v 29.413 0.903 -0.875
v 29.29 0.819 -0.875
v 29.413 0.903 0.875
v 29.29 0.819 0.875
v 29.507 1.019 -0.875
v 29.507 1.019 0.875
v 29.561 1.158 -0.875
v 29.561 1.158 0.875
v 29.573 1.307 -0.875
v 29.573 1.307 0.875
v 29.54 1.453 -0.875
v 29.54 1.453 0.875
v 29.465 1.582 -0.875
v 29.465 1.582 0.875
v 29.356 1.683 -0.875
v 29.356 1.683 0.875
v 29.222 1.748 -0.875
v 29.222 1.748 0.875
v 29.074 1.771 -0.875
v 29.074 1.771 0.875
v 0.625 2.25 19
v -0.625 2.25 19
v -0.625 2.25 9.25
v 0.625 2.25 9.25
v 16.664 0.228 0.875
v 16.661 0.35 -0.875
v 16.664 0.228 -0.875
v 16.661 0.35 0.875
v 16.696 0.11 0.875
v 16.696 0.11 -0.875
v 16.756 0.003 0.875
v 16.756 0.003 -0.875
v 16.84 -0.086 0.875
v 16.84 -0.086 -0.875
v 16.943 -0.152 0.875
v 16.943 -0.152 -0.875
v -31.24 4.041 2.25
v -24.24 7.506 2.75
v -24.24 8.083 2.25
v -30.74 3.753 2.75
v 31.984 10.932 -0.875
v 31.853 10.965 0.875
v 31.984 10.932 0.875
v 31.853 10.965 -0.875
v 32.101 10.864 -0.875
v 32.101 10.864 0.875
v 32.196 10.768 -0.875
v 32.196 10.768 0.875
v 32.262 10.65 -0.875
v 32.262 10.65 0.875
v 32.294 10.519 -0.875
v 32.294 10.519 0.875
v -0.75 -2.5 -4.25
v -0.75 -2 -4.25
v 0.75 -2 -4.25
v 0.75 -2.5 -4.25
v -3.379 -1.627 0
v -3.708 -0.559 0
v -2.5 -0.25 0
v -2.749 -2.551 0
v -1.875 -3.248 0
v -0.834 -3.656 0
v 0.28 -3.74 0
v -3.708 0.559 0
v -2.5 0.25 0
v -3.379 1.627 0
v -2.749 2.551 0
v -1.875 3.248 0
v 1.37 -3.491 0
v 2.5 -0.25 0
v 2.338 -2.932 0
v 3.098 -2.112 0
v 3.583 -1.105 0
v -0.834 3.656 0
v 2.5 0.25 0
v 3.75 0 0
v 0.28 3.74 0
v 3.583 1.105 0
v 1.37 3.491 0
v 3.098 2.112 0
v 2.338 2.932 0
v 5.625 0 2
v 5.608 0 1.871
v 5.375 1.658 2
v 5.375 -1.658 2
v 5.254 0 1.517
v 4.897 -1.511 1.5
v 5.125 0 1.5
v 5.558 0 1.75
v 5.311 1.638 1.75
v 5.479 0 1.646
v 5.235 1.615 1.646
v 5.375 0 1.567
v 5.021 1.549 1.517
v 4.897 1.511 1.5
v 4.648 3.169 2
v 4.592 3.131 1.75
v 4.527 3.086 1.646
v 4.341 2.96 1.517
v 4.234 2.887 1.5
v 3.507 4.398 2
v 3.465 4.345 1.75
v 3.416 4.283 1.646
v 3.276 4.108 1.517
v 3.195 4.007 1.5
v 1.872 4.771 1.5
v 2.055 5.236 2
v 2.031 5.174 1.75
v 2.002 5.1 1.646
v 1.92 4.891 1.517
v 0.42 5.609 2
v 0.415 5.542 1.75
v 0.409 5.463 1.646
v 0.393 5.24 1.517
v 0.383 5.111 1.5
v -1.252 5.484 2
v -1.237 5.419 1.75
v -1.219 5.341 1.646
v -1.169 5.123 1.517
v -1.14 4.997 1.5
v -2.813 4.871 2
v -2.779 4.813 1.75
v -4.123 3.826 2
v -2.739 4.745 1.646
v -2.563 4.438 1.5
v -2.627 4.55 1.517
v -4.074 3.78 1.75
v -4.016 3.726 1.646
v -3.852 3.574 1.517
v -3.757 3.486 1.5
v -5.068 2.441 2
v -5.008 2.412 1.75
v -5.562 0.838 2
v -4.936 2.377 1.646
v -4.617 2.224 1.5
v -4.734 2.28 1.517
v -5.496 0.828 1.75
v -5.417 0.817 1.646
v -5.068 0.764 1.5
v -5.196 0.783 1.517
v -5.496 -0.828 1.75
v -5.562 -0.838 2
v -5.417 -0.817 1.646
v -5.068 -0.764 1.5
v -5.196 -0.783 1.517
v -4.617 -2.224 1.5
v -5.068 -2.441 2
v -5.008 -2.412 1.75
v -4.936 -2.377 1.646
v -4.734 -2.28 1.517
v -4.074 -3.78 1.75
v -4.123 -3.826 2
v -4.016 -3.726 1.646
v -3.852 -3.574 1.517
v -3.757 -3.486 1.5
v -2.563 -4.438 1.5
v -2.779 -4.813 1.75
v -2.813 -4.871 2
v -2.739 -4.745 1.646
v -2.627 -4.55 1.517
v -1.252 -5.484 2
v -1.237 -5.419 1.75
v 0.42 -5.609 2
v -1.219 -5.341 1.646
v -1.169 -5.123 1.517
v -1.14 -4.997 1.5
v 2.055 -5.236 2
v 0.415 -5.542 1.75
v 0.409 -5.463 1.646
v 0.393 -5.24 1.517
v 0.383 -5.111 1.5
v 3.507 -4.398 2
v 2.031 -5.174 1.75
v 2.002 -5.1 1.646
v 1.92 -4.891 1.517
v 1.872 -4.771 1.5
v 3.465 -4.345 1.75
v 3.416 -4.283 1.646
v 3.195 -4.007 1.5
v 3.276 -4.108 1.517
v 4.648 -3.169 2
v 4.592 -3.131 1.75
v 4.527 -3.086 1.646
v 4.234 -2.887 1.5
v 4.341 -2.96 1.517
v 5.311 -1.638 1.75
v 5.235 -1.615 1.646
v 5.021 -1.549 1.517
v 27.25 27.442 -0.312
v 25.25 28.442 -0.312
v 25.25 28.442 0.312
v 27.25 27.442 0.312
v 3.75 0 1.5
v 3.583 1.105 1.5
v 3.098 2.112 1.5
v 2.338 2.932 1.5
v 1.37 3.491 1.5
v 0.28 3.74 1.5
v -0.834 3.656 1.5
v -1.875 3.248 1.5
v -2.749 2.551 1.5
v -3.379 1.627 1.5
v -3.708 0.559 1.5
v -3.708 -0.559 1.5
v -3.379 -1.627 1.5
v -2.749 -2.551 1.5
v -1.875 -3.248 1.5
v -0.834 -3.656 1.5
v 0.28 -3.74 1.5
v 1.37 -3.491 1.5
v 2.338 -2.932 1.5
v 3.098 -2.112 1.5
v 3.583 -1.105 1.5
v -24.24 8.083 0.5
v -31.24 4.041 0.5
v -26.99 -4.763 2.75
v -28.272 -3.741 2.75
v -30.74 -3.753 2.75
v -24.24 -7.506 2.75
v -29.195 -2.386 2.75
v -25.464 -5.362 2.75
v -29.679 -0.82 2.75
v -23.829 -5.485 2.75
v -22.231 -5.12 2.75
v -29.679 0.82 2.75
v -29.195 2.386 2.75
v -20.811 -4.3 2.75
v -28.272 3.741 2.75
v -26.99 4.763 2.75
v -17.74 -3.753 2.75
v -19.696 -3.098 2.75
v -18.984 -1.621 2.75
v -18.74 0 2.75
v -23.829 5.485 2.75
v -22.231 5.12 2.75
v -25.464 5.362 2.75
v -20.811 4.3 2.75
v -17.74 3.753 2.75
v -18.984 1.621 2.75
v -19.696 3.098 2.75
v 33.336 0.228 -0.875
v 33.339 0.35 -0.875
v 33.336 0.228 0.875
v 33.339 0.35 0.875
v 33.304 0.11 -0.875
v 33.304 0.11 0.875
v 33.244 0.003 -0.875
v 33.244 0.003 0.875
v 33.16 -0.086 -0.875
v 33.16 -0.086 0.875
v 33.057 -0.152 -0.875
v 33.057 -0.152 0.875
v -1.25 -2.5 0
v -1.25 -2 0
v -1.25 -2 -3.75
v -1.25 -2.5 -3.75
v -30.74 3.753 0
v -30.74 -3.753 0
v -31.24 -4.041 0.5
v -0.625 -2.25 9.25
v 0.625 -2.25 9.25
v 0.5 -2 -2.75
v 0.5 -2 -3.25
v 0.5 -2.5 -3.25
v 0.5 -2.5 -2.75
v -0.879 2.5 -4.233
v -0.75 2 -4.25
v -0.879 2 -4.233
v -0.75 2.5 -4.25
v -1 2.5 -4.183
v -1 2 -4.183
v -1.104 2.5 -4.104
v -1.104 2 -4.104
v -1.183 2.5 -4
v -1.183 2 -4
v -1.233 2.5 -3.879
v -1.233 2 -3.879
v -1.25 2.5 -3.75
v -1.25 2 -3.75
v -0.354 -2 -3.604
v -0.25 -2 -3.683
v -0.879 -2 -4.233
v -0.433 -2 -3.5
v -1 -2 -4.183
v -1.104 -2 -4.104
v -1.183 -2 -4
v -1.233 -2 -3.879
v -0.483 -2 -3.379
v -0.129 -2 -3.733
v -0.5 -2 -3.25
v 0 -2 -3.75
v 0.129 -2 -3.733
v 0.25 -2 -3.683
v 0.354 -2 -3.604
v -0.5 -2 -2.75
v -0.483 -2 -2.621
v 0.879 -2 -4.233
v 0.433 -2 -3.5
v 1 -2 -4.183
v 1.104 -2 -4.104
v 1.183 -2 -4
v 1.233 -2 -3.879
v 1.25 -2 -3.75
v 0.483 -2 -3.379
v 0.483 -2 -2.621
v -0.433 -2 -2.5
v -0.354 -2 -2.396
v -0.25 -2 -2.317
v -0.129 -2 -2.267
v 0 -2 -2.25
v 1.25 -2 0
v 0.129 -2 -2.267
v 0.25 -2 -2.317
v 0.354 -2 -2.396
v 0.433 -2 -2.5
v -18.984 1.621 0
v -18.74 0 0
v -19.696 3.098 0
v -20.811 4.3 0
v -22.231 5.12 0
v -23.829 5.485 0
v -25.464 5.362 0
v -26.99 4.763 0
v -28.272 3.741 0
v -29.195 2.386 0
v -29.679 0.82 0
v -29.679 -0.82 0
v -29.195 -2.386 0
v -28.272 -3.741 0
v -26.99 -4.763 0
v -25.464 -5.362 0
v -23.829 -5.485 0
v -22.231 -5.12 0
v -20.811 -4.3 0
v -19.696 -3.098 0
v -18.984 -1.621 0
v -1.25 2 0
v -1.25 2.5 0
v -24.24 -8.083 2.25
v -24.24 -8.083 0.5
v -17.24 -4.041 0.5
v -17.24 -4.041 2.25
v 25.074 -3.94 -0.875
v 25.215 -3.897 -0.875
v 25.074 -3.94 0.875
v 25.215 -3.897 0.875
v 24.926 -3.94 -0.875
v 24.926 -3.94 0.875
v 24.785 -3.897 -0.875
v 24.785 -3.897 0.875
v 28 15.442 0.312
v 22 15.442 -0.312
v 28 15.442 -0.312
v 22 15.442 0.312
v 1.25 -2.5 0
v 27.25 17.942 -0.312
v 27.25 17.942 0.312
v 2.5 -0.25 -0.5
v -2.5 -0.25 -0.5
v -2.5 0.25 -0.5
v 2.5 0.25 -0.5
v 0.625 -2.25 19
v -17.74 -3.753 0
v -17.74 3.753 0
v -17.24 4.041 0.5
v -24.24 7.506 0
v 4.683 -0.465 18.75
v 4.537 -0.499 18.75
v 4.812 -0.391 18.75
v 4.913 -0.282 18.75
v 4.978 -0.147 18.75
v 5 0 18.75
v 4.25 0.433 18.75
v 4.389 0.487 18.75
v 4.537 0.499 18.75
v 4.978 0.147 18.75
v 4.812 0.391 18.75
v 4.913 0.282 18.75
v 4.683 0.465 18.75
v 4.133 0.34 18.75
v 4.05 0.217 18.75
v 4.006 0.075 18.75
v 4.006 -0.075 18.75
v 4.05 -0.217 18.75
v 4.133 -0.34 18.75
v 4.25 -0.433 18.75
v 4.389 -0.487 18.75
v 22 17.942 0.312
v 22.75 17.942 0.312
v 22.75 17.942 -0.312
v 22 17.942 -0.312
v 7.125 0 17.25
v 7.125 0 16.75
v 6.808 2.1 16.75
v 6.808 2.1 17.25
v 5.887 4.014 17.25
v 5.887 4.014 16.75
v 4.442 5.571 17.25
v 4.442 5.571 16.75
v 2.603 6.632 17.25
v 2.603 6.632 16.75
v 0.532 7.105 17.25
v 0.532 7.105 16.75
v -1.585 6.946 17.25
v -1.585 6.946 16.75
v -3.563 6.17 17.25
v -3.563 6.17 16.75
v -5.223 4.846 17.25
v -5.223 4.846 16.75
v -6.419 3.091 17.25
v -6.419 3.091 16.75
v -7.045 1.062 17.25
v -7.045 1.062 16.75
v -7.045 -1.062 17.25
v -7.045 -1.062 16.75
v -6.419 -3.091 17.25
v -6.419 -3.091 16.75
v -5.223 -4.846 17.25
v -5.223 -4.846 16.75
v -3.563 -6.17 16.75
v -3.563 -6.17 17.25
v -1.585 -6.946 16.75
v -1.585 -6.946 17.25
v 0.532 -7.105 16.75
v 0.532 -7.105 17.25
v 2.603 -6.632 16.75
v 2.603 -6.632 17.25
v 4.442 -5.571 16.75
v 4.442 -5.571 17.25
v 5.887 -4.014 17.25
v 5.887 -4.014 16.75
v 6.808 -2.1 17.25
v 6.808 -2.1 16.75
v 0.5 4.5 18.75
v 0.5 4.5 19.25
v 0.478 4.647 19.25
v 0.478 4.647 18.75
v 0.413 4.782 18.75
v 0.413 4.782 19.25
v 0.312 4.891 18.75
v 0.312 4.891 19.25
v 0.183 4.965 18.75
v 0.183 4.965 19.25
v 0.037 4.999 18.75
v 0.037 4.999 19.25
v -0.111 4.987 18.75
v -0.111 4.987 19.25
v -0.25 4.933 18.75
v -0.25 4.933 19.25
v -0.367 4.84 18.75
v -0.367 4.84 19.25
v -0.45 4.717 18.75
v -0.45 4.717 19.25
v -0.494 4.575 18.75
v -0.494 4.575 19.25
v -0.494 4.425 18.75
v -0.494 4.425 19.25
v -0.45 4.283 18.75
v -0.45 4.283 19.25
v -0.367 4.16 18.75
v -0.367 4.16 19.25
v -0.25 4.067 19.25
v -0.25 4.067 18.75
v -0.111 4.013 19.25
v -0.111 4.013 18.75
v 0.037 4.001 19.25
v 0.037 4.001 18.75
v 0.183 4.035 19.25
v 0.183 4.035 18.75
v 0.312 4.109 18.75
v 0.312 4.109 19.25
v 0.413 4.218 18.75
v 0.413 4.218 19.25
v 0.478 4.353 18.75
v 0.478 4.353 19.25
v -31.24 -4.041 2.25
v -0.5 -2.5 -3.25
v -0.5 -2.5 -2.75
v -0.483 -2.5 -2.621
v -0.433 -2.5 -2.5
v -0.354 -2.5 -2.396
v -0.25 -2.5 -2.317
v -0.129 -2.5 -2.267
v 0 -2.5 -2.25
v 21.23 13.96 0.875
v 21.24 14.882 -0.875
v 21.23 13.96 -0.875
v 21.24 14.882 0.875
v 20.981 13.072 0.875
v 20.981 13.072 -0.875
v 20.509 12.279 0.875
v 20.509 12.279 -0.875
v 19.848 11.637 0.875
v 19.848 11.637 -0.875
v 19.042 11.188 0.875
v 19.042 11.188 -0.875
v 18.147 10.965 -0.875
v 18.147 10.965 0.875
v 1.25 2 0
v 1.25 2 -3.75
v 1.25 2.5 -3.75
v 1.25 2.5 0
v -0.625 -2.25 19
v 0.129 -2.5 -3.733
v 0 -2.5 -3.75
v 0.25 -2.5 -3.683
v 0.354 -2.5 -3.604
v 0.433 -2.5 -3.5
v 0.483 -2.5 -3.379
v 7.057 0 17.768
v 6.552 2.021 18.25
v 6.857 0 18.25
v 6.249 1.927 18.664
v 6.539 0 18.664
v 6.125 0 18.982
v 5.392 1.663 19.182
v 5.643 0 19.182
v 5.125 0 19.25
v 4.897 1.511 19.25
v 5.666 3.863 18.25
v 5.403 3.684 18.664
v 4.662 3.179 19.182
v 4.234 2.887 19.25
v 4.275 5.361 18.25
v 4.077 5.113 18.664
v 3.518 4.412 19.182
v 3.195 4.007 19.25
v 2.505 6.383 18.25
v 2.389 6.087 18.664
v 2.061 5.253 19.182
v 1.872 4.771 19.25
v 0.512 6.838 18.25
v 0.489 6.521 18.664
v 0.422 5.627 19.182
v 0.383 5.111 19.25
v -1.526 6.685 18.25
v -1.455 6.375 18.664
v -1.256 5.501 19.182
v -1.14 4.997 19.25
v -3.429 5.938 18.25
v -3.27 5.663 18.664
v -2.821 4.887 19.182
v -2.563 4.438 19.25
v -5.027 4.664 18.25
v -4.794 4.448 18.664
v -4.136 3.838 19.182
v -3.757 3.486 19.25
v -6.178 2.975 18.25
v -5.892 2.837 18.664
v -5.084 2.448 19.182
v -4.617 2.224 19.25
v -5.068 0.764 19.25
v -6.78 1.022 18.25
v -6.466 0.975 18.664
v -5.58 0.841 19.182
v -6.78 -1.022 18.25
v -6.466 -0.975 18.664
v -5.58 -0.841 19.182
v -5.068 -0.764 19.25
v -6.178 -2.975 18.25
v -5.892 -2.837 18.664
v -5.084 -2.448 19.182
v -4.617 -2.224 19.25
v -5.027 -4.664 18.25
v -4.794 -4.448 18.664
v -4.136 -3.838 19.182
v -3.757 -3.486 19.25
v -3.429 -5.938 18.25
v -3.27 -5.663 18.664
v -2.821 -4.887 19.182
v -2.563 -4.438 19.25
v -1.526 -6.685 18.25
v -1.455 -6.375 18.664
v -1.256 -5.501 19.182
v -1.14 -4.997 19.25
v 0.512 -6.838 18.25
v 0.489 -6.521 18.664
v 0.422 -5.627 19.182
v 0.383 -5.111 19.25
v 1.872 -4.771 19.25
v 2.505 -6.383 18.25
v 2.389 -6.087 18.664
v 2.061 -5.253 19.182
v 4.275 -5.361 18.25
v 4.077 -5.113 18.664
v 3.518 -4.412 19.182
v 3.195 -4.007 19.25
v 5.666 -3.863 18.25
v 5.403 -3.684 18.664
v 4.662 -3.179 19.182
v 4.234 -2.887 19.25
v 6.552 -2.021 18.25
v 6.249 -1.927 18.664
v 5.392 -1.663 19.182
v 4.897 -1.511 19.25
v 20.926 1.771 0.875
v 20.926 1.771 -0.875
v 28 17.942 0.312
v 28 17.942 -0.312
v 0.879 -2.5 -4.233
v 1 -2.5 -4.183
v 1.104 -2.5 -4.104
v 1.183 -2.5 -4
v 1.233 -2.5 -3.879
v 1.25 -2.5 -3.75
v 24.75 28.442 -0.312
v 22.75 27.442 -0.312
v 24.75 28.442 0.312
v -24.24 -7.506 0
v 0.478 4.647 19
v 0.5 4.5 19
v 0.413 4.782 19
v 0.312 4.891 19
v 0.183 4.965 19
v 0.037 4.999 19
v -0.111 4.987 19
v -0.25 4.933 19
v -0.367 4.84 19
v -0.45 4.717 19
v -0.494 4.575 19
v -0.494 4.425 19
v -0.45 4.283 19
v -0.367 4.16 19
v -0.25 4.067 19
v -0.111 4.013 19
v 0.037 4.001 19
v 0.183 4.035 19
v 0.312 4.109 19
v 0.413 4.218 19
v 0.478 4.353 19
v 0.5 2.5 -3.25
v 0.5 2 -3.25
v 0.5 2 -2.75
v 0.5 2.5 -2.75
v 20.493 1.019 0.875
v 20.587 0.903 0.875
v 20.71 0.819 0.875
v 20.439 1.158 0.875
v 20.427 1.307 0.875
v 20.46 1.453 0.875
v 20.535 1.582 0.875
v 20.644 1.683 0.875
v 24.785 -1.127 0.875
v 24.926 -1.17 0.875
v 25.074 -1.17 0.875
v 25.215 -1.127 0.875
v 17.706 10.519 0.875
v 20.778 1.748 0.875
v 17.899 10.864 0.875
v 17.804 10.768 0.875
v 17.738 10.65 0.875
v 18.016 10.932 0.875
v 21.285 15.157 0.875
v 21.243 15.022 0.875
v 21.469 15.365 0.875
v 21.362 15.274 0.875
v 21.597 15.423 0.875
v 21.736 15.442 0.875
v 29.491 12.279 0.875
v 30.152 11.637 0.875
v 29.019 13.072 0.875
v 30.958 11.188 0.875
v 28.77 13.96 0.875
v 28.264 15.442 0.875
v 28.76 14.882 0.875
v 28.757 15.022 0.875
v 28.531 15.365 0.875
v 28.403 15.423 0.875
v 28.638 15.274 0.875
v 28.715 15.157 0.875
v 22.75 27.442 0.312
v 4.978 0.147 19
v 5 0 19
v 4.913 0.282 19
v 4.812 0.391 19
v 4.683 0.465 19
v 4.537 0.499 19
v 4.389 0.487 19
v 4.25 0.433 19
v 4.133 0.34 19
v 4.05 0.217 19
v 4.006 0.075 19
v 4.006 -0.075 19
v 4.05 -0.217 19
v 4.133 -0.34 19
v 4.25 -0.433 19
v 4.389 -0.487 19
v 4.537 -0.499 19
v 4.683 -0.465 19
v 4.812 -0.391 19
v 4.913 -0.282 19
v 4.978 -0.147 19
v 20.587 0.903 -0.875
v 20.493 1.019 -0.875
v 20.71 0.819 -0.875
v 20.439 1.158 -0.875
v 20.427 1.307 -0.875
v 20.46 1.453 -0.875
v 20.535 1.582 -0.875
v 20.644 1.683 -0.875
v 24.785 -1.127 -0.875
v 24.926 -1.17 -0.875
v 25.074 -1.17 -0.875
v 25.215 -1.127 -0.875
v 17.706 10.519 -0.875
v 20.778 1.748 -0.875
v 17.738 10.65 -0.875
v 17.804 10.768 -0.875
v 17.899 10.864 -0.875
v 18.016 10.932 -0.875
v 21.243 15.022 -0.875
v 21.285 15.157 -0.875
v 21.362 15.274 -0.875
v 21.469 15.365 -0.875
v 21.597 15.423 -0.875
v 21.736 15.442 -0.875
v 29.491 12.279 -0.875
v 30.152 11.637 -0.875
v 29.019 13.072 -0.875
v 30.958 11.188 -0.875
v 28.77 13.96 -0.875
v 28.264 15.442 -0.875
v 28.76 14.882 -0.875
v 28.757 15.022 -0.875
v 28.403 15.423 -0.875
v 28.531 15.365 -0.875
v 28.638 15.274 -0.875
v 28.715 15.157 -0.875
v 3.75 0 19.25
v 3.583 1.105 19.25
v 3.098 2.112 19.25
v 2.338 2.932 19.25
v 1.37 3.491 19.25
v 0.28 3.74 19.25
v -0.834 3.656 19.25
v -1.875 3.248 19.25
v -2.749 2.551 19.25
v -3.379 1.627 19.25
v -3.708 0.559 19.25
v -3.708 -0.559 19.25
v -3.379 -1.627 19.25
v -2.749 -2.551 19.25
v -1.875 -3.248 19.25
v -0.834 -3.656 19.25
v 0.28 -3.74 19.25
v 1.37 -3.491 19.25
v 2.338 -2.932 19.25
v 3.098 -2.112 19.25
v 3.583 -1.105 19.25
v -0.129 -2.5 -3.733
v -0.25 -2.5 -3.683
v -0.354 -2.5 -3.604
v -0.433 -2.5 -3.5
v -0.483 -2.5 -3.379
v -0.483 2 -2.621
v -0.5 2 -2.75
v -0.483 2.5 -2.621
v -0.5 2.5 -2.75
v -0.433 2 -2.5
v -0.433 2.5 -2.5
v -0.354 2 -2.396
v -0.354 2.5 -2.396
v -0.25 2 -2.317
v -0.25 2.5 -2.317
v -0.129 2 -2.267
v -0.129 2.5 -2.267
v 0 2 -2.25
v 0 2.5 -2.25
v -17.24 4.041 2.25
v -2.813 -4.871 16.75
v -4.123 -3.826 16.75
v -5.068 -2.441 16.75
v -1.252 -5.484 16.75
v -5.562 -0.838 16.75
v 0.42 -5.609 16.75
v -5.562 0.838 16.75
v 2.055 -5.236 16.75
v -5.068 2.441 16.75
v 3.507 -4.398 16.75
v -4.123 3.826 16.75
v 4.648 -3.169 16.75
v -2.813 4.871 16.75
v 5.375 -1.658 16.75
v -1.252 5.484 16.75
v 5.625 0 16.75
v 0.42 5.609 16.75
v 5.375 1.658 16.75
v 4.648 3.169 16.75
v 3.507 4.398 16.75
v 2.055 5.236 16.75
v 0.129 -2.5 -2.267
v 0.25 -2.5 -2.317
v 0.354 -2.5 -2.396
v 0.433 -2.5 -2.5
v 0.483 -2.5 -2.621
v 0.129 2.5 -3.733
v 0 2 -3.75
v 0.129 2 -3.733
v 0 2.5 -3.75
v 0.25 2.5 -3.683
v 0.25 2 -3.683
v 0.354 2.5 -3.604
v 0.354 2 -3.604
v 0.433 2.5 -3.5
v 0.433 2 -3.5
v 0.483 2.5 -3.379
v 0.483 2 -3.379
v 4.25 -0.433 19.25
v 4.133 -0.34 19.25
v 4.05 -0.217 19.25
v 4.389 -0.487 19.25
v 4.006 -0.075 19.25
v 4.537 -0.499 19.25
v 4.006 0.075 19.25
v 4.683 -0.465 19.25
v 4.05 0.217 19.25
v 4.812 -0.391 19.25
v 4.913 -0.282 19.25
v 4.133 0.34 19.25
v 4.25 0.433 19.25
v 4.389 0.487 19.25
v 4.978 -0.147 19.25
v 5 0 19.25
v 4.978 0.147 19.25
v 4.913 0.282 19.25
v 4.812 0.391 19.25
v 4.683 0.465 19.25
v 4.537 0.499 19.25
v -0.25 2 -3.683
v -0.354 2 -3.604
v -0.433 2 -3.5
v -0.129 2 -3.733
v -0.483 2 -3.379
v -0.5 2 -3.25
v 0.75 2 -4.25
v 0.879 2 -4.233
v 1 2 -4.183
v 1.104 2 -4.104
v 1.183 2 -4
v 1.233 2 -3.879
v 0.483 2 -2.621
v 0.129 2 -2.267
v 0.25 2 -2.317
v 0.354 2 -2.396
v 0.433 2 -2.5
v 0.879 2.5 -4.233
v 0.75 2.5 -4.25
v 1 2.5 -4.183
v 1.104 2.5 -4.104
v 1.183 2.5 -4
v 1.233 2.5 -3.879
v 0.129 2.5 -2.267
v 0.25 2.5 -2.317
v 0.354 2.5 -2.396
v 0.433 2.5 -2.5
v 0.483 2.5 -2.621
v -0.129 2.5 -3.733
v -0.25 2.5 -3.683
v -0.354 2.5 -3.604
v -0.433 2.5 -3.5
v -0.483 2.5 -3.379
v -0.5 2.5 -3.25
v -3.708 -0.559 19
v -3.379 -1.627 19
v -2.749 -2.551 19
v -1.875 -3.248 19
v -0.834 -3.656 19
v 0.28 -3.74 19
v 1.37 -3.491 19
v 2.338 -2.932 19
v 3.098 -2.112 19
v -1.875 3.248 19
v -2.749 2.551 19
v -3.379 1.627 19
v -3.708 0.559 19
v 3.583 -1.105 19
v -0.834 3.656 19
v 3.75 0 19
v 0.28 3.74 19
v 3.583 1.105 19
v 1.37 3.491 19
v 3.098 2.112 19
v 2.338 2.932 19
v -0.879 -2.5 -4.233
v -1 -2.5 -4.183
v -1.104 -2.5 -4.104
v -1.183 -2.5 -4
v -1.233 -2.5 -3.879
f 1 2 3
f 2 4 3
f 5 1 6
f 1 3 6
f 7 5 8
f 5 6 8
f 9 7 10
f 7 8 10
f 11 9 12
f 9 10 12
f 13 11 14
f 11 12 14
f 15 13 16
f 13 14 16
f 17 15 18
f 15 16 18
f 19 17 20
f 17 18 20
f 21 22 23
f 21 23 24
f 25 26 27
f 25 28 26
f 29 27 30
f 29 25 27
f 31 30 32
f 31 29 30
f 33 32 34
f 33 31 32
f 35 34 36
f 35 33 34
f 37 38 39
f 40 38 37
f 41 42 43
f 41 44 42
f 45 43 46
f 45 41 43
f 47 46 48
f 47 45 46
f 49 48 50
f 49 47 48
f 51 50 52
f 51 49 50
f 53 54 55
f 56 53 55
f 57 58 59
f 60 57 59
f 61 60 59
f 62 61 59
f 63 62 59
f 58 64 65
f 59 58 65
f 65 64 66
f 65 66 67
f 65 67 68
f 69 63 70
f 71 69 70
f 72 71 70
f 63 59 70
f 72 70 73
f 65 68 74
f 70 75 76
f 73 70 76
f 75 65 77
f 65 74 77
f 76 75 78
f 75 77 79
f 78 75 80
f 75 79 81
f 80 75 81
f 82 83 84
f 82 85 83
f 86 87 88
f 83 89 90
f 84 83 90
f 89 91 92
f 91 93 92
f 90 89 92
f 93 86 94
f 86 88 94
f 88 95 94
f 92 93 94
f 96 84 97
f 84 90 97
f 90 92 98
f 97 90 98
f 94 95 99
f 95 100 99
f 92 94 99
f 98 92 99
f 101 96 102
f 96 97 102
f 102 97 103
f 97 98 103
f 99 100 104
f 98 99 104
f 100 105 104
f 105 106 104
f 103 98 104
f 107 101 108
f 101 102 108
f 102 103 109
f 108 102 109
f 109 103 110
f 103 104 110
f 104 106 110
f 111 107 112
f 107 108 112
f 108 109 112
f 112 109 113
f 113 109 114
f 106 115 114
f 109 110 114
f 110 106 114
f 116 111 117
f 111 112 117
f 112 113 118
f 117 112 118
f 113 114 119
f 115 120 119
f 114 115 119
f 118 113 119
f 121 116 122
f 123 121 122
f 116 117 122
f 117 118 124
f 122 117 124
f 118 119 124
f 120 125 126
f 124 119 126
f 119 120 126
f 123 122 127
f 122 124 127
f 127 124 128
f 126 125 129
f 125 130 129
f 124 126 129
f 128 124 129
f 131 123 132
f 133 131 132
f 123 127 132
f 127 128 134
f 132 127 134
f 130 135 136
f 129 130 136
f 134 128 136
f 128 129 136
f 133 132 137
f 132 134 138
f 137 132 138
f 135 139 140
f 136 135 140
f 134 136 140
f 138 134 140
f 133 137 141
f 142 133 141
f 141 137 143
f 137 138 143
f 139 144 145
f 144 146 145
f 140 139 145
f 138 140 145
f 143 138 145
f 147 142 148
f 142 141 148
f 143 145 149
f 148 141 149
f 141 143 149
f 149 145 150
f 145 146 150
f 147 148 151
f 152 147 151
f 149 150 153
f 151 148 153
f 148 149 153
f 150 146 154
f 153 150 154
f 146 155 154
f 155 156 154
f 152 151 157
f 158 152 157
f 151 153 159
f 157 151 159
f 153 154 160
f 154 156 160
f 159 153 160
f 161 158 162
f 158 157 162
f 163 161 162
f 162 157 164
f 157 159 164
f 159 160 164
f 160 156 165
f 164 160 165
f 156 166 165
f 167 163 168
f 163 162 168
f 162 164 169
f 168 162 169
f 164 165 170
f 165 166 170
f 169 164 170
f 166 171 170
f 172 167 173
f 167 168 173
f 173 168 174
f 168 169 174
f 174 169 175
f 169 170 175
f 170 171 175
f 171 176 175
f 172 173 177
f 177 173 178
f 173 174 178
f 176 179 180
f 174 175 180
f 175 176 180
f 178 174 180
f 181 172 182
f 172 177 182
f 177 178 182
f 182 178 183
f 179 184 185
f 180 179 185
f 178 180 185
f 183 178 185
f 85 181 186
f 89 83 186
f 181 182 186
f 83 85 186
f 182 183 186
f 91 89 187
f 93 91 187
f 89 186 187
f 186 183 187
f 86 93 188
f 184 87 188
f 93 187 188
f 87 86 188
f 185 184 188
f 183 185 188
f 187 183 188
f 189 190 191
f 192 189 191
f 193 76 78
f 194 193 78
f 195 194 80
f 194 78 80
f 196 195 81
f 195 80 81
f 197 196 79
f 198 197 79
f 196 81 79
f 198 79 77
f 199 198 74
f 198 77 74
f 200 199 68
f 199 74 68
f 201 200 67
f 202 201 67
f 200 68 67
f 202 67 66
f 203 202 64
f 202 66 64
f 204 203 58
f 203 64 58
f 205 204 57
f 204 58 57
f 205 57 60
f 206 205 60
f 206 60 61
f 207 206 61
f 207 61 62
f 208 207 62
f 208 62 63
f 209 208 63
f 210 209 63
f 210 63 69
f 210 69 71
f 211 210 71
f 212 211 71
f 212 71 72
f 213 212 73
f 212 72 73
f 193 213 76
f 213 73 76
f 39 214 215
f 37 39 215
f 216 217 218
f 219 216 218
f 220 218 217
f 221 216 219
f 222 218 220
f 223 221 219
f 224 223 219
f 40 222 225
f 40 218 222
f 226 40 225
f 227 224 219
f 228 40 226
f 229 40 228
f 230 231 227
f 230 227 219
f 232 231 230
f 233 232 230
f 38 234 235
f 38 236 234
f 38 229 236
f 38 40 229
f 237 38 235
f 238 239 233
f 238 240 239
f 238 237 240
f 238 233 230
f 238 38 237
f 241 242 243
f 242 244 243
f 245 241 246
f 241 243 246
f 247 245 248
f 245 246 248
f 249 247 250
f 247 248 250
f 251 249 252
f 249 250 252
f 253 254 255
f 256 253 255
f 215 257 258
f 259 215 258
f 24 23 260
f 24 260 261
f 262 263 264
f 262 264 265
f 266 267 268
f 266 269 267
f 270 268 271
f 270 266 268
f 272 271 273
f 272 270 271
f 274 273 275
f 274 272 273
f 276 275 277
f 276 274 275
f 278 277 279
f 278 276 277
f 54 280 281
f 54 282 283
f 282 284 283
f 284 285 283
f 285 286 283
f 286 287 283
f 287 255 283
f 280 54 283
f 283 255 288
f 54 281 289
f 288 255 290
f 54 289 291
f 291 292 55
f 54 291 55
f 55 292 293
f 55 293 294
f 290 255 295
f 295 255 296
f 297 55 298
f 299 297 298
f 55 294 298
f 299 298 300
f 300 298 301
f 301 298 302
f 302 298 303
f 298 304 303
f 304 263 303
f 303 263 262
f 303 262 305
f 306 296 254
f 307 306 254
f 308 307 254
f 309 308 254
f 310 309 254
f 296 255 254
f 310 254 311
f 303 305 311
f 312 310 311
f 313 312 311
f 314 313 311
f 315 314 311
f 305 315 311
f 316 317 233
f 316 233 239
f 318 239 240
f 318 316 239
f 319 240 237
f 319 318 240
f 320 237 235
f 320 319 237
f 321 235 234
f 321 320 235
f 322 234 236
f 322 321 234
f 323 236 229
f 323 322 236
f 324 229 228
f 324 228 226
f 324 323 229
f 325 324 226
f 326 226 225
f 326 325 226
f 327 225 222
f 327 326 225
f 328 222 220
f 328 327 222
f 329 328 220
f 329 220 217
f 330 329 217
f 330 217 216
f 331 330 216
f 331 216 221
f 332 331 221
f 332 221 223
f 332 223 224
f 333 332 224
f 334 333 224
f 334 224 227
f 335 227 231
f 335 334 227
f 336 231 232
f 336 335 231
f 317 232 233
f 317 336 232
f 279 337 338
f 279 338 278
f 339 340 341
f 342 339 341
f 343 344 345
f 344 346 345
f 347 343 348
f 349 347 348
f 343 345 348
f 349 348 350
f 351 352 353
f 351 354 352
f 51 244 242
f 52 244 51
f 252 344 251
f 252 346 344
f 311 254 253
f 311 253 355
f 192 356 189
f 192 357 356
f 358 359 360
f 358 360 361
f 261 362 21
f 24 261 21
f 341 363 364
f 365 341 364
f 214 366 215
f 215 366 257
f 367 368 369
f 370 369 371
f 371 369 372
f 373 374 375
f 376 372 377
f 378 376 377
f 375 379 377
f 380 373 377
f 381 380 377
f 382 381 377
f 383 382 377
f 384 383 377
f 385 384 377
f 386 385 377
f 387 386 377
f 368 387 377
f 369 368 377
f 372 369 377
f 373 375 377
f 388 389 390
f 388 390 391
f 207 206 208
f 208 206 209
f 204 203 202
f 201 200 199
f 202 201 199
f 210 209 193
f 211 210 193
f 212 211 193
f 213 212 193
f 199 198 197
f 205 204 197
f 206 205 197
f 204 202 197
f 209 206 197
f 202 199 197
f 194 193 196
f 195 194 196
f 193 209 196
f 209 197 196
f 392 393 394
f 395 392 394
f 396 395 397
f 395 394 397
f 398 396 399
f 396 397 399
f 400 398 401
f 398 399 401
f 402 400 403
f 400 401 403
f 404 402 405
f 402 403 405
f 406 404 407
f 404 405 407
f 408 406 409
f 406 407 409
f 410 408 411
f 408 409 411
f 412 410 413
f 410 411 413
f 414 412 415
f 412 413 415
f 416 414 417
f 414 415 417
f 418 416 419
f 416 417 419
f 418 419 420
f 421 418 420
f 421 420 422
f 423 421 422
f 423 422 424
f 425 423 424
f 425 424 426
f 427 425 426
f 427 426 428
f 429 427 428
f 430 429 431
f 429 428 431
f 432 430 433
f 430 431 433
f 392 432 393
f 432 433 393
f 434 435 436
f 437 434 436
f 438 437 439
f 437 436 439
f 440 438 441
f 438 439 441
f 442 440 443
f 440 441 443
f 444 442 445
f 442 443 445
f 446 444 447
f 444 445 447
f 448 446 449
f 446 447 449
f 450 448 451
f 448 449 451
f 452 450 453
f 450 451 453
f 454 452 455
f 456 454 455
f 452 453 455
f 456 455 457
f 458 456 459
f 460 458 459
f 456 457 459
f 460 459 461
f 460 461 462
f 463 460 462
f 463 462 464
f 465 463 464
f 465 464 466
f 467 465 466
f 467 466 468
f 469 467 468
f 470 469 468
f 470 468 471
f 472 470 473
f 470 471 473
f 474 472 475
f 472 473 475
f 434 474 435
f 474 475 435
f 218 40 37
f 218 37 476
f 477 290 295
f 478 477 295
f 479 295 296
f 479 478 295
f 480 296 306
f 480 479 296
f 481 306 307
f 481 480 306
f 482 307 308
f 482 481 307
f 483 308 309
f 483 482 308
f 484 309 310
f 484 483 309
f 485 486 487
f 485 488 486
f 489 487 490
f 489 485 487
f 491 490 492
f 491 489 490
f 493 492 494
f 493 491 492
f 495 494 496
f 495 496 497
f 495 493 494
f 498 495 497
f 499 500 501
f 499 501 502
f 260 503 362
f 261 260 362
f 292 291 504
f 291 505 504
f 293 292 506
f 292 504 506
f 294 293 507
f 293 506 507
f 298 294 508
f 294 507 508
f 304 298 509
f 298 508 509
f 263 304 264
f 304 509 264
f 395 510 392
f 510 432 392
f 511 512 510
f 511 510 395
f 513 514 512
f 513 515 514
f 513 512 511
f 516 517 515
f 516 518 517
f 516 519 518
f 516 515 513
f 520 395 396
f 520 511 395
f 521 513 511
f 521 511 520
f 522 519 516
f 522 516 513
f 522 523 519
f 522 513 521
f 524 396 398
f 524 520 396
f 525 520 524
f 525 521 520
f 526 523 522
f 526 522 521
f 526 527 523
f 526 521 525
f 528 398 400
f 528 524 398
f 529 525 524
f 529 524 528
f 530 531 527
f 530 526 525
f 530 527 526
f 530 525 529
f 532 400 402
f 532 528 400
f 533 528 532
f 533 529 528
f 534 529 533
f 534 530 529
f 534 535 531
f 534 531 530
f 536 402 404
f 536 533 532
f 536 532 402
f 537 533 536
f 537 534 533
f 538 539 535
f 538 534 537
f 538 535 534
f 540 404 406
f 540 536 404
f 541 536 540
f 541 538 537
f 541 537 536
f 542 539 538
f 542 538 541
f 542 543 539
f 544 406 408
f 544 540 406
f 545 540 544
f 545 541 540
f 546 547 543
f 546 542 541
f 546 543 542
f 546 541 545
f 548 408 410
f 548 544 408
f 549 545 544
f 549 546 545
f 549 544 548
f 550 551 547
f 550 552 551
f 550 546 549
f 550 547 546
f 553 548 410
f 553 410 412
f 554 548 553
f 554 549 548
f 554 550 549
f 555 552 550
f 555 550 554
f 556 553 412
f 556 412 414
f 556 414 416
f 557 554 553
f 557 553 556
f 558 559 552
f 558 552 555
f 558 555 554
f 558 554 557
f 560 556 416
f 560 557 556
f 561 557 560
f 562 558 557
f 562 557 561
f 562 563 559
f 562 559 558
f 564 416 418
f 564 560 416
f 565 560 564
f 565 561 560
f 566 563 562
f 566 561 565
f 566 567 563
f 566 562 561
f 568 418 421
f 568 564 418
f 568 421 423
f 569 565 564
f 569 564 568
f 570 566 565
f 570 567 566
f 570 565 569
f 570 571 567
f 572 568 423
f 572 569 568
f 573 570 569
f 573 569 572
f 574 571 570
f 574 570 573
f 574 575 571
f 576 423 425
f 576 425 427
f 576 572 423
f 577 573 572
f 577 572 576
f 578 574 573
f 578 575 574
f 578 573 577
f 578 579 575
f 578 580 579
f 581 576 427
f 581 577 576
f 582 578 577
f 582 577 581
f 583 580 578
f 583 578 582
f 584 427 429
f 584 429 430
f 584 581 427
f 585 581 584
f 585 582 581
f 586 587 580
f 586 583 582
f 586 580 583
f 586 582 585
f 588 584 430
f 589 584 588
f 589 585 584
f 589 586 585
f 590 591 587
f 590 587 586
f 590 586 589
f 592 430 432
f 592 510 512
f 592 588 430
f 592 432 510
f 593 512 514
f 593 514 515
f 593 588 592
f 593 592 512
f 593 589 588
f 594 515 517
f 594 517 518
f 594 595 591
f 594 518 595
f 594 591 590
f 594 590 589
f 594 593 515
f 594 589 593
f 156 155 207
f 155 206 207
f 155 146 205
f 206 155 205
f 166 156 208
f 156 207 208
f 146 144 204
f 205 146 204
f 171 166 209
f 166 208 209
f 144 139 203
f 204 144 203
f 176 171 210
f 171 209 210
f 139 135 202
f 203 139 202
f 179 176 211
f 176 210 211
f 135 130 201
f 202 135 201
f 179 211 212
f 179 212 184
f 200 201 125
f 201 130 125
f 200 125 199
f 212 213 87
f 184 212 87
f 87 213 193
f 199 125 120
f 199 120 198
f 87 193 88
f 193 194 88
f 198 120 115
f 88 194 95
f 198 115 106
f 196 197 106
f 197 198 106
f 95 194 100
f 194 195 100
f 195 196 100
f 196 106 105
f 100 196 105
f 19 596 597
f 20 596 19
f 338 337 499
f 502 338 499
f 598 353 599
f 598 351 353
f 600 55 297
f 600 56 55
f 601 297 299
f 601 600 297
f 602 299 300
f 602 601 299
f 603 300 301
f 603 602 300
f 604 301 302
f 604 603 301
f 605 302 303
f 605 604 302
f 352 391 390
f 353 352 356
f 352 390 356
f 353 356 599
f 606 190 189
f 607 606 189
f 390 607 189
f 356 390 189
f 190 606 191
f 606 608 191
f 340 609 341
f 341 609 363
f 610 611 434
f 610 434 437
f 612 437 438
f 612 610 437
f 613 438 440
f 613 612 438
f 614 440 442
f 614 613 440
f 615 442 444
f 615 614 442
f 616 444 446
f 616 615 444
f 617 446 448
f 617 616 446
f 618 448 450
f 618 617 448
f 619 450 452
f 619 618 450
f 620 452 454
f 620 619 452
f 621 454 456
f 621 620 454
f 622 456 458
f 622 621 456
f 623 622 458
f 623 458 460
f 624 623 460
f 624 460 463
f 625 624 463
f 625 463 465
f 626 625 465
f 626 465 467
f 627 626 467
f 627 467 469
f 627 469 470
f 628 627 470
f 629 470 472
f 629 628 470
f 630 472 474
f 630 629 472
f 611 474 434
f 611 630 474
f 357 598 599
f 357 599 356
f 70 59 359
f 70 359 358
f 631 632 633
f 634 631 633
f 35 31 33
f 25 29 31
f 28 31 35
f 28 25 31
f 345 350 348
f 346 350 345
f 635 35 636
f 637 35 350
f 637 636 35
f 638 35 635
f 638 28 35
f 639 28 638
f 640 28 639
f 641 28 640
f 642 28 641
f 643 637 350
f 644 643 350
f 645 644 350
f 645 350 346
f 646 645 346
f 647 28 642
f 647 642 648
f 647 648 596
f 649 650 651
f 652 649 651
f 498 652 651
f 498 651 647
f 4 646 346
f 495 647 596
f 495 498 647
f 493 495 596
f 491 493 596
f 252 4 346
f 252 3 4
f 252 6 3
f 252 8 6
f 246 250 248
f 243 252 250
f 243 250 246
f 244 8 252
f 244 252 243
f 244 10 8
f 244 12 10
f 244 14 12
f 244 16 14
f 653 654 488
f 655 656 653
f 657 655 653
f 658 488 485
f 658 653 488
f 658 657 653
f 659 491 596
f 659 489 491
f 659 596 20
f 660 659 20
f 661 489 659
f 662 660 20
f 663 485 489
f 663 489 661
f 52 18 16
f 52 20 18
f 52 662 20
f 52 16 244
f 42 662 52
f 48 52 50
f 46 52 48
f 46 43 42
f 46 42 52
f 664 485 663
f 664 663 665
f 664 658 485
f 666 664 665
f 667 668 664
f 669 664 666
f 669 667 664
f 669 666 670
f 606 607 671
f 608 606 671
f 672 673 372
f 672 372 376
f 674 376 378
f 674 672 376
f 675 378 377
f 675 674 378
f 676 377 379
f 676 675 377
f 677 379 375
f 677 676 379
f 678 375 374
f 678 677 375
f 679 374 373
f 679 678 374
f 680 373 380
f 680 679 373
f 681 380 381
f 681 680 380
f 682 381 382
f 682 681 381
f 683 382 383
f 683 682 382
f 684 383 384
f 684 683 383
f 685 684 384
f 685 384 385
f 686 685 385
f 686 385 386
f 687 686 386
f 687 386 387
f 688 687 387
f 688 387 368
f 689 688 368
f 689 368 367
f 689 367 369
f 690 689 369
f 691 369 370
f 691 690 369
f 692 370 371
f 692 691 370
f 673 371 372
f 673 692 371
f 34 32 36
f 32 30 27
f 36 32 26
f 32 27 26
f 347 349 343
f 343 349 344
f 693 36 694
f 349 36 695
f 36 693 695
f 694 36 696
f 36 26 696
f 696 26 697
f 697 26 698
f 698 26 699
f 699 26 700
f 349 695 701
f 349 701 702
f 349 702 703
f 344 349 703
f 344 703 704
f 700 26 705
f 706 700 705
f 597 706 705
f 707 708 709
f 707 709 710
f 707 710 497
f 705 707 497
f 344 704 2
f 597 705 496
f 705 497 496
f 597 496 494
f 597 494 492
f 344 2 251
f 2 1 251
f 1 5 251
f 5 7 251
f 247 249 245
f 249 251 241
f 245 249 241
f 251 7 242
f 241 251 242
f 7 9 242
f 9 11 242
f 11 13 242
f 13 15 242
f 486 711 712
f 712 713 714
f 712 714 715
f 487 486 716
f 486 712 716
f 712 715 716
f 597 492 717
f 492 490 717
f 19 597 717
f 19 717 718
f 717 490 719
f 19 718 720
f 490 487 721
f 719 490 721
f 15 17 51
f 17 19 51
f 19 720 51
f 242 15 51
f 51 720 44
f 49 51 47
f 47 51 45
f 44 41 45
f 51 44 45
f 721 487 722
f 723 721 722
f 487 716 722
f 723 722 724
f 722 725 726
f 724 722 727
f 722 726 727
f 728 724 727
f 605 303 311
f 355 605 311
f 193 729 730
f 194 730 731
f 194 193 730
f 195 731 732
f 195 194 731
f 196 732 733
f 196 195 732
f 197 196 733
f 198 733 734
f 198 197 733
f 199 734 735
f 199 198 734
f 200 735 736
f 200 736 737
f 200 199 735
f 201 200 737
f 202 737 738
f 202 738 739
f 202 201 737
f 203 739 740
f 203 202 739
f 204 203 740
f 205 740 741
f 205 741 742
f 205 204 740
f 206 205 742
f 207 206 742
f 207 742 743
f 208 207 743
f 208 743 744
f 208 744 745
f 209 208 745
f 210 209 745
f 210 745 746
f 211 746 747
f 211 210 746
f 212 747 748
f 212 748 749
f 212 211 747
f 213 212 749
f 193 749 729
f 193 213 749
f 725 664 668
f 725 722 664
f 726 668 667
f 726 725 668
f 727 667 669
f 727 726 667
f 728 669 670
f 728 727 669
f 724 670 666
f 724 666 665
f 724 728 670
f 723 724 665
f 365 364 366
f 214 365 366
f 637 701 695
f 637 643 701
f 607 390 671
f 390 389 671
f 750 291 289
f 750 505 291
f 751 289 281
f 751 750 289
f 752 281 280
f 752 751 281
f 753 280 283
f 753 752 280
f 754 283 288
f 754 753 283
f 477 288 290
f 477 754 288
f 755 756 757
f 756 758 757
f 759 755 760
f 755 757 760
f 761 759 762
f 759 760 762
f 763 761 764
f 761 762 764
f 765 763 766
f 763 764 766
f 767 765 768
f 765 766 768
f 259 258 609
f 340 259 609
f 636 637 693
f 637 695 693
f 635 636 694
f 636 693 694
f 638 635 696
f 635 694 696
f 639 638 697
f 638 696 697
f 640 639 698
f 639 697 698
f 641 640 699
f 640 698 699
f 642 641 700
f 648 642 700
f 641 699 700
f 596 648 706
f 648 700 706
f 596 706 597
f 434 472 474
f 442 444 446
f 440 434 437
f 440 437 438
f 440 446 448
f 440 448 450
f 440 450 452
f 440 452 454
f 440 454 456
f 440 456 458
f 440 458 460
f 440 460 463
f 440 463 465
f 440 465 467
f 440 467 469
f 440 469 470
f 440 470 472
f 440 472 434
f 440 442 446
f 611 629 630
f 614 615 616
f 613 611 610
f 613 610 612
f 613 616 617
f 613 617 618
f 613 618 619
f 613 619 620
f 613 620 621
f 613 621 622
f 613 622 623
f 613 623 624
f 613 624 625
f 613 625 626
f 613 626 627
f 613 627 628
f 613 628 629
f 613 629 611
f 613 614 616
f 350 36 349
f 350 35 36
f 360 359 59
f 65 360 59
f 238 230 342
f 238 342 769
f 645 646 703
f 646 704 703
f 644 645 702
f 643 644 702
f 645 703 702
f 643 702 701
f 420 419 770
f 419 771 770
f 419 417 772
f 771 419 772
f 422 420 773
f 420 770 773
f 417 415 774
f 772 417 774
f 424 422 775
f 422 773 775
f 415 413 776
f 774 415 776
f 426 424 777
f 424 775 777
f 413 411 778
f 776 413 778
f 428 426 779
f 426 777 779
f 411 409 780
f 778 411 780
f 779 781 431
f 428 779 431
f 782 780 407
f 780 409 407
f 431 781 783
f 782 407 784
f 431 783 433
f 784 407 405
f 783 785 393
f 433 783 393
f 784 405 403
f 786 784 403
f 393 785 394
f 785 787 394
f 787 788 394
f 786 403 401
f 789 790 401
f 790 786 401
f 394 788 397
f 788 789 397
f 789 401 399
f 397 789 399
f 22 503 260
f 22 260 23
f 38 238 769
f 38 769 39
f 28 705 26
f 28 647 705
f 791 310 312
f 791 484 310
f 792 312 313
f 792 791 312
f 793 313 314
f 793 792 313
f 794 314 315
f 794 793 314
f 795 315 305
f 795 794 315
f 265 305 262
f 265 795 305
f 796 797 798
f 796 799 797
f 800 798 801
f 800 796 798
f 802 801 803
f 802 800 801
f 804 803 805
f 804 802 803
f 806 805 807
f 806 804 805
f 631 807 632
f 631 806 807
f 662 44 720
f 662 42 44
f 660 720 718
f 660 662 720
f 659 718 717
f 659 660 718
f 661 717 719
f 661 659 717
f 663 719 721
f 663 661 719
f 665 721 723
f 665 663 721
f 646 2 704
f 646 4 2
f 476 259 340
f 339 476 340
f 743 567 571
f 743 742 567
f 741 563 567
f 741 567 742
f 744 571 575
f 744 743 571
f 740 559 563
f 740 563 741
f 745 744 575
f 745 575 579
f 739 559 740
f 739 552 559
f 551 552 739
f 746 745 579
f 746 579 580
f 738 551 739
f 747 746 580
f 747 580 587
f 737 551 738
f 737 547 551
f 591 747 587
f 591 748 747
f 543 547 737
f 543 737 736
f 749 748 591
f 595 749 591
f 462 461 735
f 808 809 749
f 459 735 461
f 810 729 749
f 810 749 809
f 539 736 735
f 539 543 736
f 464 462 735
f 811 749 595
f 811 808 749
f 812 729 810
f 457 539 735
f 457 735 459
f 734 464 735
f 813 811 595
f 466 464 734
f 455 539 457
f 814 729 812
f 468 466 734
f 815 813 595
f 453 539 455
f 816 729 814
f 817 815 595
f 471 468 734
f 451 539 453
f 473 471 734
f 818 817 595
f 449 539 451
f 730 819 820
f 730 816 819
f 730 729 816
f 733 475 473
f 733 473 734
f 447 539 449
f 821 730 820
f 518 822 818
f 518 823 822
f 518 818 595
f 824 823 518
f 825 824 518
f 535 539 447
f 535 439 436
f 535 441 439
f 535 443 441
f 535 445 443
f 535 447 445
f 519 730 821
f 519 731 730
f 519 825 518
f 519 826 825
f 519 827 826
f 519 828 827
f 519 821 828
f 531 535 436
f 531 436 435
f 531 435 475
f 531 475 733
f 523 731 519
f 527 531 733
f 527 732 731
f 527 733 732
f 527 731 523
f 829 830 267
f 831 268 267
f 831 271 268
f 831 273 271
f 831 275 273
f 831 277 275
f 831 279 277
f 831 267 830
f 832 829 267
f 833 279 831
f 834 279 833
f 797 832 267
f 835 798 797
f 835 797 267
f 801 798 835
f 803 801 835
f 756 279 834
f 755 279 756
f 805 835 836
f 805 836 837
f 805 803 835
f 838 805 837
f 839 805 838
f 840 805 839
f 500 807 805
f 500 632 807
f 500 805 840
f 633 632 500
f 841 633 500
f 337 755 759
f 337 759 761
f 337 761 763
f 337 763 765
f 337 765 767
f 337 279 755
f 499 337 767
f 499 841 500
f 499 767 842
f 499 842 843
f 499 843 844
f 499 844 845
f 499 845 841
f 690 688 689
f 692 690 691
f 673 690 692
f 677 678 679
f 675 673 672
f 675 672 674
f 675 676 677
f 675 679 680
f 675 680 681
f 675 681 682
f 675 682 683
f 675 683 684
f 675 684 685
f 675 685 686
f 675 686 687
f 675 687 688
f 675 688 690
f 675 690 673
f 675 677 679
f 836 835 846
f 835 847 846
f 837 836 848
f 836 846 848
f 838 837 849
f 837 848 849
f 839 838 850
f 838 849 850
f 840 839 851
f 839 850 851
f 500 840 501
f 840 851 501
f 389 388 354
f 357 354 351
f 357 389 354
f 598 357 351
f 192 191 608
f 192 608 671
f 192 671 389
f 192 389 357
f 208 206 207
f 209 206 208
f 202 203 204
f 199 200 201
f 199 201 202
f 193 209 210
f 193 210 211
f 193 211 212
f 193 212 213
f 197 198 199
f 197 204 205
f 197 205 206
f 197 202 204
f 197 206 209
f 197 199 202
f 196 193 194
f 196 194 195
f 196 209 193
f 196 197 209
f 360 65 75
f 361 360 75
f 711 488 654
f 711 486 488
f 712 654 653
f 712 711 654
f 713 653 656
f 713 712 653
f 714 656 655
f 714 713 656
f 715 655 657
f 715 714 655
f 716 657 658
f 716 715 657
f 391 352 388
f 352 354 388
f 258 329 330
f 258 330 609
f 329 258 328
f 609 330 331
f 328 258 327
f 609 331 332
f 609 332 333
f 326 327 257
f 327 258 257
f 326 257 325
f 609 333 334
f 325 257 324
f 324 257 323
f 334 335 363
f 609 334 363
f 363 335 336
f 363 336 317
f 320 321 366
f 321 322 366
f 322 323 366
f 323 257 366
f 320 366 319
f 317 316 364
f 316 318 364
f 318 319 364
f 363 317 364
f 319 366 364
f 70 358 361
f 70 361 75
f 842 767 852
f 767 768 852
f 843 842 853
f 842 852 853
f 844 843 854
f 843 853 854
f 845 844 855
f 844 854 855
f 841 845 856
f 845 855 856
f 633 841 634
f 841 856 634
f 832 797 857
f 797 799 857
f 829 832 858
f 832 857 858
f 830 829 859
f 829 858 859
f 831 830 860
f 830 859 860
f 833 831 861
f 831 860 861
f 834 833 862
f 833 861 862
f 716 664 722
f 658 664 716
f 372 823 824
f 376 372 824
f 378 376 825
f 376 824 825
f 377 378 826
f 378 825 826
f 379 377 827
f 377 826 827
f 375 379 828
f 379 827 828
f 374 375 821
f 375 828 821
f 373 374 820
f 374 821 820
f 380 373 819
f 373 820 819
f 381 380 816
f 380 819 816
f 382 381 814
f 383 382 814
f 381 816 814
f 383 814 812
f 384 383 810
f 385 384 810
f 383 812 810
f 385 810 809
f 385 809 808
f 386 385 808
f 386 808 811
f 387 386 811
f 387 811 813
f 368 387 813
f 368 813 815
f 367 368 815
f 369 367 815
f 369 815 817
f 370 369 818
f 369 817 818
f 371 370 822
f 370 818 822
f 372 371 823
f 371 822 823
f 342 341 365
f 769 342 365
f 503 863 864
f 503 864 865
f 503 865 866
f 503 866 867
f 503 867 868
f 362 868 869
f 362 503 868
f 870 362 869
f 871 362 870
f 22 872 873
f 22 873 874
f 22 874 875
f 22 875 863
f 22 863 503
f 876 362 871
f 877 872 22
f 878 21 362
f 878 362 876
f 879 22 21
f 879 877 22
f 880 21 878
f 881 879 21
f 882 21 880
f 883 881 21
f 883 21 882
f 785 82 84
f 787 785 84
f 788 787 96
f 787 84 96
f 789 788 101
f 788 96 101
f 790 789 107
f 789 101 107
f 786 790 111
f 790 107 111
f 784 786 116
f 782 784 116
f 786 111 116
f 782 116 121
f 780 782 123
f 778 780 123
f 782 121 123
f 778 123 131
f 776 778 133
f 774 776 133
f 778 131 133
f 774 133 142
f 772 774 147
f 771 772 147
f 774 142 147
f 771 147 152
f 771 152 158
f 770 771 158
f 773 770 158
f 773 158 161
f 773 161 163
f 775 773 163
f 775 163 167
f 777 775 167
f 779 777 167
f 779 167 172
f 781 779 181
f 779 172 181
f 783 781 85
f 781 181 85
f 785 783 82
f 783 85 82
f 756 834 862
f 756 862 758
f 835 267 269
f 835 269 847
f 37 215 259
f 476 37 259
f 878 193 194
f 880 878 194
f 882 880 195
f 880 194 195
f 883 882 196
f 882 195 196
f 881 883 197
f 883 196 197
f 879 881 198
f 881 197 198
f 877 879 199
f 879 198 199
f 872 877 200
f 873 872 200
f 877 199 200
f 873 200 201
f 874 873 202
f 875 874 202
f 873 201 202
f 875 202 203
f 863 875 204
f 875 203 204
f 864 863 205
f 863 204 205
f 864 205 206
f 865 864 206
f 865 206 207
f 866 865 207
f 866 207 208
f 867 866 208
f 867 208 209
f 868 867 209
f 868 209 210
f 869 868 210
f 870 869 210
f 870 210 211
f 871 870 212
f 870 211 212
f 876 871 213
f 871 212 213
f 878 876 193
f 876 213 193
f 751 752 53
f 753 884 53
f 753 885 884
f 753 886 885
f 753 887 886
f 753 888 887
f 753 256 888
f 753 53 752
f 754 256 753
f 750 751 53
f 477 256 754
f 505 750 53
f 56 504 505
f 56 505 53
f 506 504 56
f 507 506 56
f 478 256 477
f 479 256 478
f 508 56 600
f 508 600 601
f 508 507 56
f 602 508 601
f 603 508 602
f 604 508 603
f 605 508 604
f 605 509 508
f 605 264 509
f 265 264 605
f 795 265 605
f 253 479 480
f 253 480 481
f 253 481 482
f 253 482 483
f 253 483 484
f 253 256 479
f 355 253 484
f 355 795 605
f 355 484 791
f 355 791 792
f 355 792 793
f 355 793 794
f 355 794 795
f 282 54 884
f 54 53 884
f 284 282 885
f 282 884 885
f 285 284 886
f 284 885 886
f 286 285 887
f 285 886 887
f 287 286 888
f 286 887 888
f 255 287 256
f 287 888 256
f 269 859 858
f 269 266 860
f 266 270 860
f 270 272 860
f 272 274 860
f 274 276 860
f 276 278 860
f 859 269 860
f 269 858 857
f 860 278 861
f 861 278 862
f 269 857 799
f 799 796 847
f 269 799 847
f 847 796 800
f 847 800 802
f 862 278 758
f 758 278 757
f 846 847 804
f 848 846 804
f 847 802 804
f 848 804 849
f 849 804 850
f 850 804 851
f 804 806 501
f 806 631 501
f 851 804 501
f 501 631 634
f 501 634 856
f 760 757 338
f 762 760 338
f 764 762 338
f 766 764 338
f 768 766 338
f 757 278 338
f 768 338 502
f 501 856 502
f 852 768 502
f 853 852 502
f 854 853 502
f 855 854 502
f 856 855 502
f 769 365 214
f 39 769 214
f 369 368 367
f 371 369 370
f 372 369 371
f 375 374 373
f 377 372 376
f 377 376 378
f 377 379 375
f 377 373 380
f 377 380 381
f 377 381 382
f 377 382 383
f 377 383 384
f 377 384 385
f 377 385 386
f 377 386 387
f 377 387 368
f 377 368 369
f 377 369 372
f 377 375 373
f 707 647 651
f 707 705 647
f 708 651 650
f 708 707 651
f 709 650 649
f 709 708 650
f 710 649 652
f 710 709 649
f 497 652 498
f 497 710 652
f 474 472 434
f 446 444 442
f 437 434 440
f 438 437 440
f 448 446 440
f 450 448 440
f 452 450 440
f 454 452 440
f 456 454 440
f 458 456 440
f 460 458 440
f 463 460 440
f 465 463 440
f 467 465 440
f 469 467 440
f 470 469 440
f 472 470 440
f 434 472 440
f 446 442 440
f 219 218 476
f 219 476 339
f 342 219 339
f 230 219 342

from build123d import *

# Parameters (mm, degrees)
F0_R      = 3.75
F1_DEPTH  = 1.5
F2_START  = 1.5
F0_R_2    = 5.625
F2_DEPTH  = 15.25
F3_START  = 16.75
F0_R_3    = 7.125
F3_DEPTH  = 2.5
F4_DEPTH  = 17.5
F5_W      = 1.25
F5_H      = 4.5
F6_DEPTH  = 10
F5_R      = 0.5
F7_DEPTH  = 0.5
F8_START  = -0.25
F8_DEPTH  = 0.25
F9_W      = 1.25
F9_H      = 0.5
F9_W_2    = 2.5
F10_DEPTH = 0.25
F11_START = 2
F9_H_2    = 3.75
F9_W_3    = 1
F9_H_3    = 1.5
F11_DEPTH = 0.5
F12_START = -2
F12_DEPTH = 0.5
F13_R     = 2
F14_R     = 0.49999
F14_2_R   = 0.49999
F14_3_R   = 0.49999
F15_R     = 5.5
F16_DEPTH = 2.75
F17_SIZE  = 0.5
F19_DEPTH = 0.875
F18_W     = 4.5
F18_H     = 2.5
F18_W_2   = 0.75
F18_H_2   = 10.5
F20_DEPTH = 0.3125
F21_R     = 0.5
F22_SIZE2 = 1
F22_SIZE  = 2


# Not quite as in the source:
# - a fillet or chamfer is up to 0.001 mm smaller than in the source, because OpenCascade refuses the exact size


with BuildPart() as f1:
    # F0 (on Top) → F1 (new body)
    with BuildSketch(Plane.XY):
        Circle(F0_R)
    extrude(amount=F1_DEPTH)


with BuildPart() as f2:
    # F0 (on Top) → F2 (new body)
    with BuildSketch(Plane.XY.offset(F2_START)):
        Circle(F0_R_2)
        Circle(F0_R, mode=Mode.SUBTRACT)
    extrude(amount=F2_DEPTH)

    # F0 (on Top) → F3 (join)
    with BuildSketch(Plane.XY.offset(F3_START)):
        Circle(F0_R_3)
        Circle(F0_R_2, mode=Mode.SUBTRACT)
        Circle(F0_R_2)
        Circle(F0_R, mode=Mode.SUBTRACT)
    extrude(amount=F3_DEPTH)

    # F5 (on face) → F7 (cut)
    with BuildSketch(Plane.XY.offset(19.25)):
        with Locations((0, 4.5)):
            Circle(F5_R)
        with Locations((4.5, 0)):
            Circle(F5_R)
    extrude(amount=-F7_DEPTH, mode=Mode.SUBTRACT)

    # F13
    f13_edges = [f2.edges().sort_by_distance(p)[0] for p in [
        (-7.125, 0, 19.25),
    ]]
    fillet(f13_edges, radius=F13_R)

    # F14#3 (radius 0.5 in the source; OpenCascade refuses exactly that, so slightly less here)
    f14_3_edges = [f2.edges().sort_by_distance(p)[0] for p in [
        (-5.625, 0, 1.5),
    ]]
    fillet(f14_3_edges, radius=F14_3_R)


with BuildPart() as f4:
    # F4 (new, through all): a face of the model
    f4_faces = [f1.part.faces().sort_by_distance(p)[0] for p in [
        (0, 0, 1.5),
    ]]
    extrude(f4_faces, amount=F4_DEPTH)

    # F5 (on face) → F6 (cut)
    with BuildSketch(Plane.XY.offset(19.25)):
        Rectangle(F5_W, F5_H)
    extrude(amount=-F6_DEPTH, mode=Mode.SUBTRACT)


with BuildPart() as f8:
    # F5 (on face) → F8 (new body)
    with BuildSketch(Plane.XY.offset(19.25).offset(F8_START)):
        with Locations((0, 4.5)):
            Circle(F5_R)
    extrude(amount=-F8_DEPTH)


with BuildPart() as f8b:
    # F5 (on face) → F8, piece 2 (new body)
    with BuildSketch(Plane.XY.offset(19.25).offset(F8_START)):
        with Locations((4.5, 0)):
            Circle(F5_R)
    extrude(amount=-F8_DEPTH)


with BuildPart() as f1_1:
    add(f1.part)

    # F9 (on Front) → F10 (join, symmetric)
    with BuildSketch(Plane.XZ):
        with Locations((-1.875, -0.25)):
            Rectangle(F9_W, F9_H)
        with Locations((0, -0.25)):
            Rectangle(F9_W_2, F9_H)
        with Locations((1.875, -0.25)):
            Rectangle(F9_W, F9_H)
    extrude(amount=F10_DEPTH, both=True)


with BuildPart() as f11:
    # F9 (on Front) → F11 (new body)
    with BuildSketch(Plane.XZ.offset(F11_START)):
        with Locations((0, -2.375)):
            Rectangle(F9_W_2, F9_H_2)
        with Locations((0, -3)):
            Rectangle(F9_W_3, F9_H_3, mode=Mode.SUBTRACT)
        with Locations((0, -0.25)):
            Rectangle(F9_W_2, F9_H)
    extrude(amount=F11_DEPTH)

    # F14#2 (radius 0.5 in the source; OpenCascade refuses exactly that, so slightly less here)
    f14_2_edges = [f11.edges().sort_by_distance(p)[0] for p in [
        (1.25, -2.25, -4.25),
        (-1.25, -2.25, -4.25),
        (-0.5, -2.25, -2.25),
        (0.5, -2.25, -2.25),
        (0.5, -2.25, -3.75),
        (-0.5, -2.25, -3.75),
    ]]
    fillet(f14_2_edges, radius=F14_2_R)


with BuildPart() as f12:
    # F9 (on Front) → F12 (new body)
    with BuildSketch(Plane.XZ.offset(F12_START)):
        with Locations((0, -2.375)):
            Rectangle(F9_W_2, F9_H_2)
        with Locations((0, -3)):
            Rectangle(F9_W_3, F9_H_3, mode=Mode.SUBTRACT)
        with Locations((0, -0.25)):
            Rectangle(F9_W_2, F9_H)
    extrude(amount=-F12_DEPTH)

    # F14 (radius 0.5 in the source; OpenCascade refuses exactly that, so slightly less here)
    f14_edges = [f12.edges().sort_by_distance(p)[0] for p in [
        (1.25, 2.25, -4.25),
        (-1.25, 2.25, -4.25),
        (-0.5, 2.25, -2.25),
        (0.5, 2.25, -2.25),
        (0.5, 2.25, -3.75),
        (-0.5, 2.25, -3.75),
    ]]
    fillet(f14_edges, radius=F14_R)


with BuildPart() as f16:
    # F15 (on Top) → F16 (new body)
    with BuildSketch(Plane.XY):
        Polygon((-31.2399982514, 4.0414518843), (-31.2399982514, -4.0414518843), (-24.2399982514, -8.0829037687), (-17.2399982514, -4.0414518843), (-17.2399982514, 4.0414518843), (-24.2399982514, 8.0829037687), align=None)
        with Locations((-24.2399982514, 0)):
            Circle(F15_R, mode=Mode.SUBTRACT)
    extrude(amount=F16_DEPTH)

    # F17
    f17_edges = [f16.edges().sort_by_distance(p)[0] for p in [
        (-20.739998, -6.062178, 2.75),
        (-27.739998, -6.062178, 2.75),
        (-31.239998, 0, 2.75),
        (-27.739998, 6.062178, 2.75),
        (-20.739998, 6.062178, 2.75),
        (-17.239998, 0, 2.75),
        (-20.739998, 6.062178, 0),
        (-27.739998, 6.062178, 0),
        (-31.239998, 0, 0),
        (-27.739998, -6.062178, 0),
        (-20.739998, -6.062178, 0),
        (-17.239998, 0, 0),
    ]]
    chamfer(f17_edges, length=F17_SIZE)


with BuildPart() as f19:
    # F18 (on Top) → F19 (new body, symmetric)
    with BuildSketch(Plane.XY):
        with BuildLine():
            Line((17.75, 10.9423203664), (16.625, 0))
            Line((16.625, 0), (25, -4))
            Line((25, -4), (33.375, 0))
            Line((33.375, 0), (32.25, 10.9423203664))
            ThreePointArc((32.25, 10.9423203664), (29.4375, 12.3485703664), (28.875, 15.4423203664))
            Line((28.875, 15.4423203664), (28, 15.4423203664))
            Line((28, 15.4423203664), (27.25, 15.4423203664))
            Line((27.25, 15.4423203664), (22.75, 15.4423203664))
            Line((22.75, 15.4423203664), (22, 15.4423203664))
            Line((22, 15.4423203664), (21.125, 15.4423203664))
            ThreePointArc((21.125, 15.4423203664), (20.5625, 12.3485703664), (17.75, 10.9423203664))
        make_face()
        Polygon((31.28125, 1.7705066837), (25, -1.2294933163), (18.71875, 1.7705066837), align=None, mode=Mode.SUBTRACT)
    extrude(amount=F19_DEPTH, both=True)

    # F21
    f21_edges = [f19.edges().sort_by_distance(p)[0] for p in [
        (18.71875, 1.770507, 0),
        (25, -1.229493, 0),
        (31.28125, 1.770507, 0),
        (33.375, 0, 0),
        (25, -4, 0),
        (16.625, 0, 0),
        (32.25, 10.94232, 0),
        (28.875, 15.44232, 0),
        (21.125, 15.44232, 0),
        (17.75, 10.94232, 0),
    ]]
    fillet(f21_edges, radius=F21_R)


with BuildPart() as f20:
    # F18 (on Top) → F20 (new body, symmetric)
    with BuildSketch(Plane.XY):
        with Locations((25, 16.6923203664)):
            Rectangle(F18_W, F18_H)
        with Locations((27.625, 16.6923203664)):
            Rectangle(F18_W_2, F18_H)
        with Locations((22.375, 16.6923203664)):
            Rectangle(F18_W_2, F18_H)
        with Locations((25, 23.1923203664)):
            Rectangle(F18_W, F18_H_2)
    extrude(amount=F20_DEPTH, both=True)

    # F22
    f22_edges = [f20.edges().sort_by_distance(p)[0] for p in [
        (27.25, 28.44232, 0),
        (22.75, 28.44232, 0),
    ]]
    f22_side = f20.faces().sort_by_distance((25, 28.44232, 0))[0]
    chamfer(f22_edges, length=F22_SIZE, length2=F22_SIZE2, reference=f22_side)


solid = Compound([f2.part, f4.part, f8.part, f8b.part, f1_1.part, f11.part, f12.part, f16.part, f19.part, f20.part])
